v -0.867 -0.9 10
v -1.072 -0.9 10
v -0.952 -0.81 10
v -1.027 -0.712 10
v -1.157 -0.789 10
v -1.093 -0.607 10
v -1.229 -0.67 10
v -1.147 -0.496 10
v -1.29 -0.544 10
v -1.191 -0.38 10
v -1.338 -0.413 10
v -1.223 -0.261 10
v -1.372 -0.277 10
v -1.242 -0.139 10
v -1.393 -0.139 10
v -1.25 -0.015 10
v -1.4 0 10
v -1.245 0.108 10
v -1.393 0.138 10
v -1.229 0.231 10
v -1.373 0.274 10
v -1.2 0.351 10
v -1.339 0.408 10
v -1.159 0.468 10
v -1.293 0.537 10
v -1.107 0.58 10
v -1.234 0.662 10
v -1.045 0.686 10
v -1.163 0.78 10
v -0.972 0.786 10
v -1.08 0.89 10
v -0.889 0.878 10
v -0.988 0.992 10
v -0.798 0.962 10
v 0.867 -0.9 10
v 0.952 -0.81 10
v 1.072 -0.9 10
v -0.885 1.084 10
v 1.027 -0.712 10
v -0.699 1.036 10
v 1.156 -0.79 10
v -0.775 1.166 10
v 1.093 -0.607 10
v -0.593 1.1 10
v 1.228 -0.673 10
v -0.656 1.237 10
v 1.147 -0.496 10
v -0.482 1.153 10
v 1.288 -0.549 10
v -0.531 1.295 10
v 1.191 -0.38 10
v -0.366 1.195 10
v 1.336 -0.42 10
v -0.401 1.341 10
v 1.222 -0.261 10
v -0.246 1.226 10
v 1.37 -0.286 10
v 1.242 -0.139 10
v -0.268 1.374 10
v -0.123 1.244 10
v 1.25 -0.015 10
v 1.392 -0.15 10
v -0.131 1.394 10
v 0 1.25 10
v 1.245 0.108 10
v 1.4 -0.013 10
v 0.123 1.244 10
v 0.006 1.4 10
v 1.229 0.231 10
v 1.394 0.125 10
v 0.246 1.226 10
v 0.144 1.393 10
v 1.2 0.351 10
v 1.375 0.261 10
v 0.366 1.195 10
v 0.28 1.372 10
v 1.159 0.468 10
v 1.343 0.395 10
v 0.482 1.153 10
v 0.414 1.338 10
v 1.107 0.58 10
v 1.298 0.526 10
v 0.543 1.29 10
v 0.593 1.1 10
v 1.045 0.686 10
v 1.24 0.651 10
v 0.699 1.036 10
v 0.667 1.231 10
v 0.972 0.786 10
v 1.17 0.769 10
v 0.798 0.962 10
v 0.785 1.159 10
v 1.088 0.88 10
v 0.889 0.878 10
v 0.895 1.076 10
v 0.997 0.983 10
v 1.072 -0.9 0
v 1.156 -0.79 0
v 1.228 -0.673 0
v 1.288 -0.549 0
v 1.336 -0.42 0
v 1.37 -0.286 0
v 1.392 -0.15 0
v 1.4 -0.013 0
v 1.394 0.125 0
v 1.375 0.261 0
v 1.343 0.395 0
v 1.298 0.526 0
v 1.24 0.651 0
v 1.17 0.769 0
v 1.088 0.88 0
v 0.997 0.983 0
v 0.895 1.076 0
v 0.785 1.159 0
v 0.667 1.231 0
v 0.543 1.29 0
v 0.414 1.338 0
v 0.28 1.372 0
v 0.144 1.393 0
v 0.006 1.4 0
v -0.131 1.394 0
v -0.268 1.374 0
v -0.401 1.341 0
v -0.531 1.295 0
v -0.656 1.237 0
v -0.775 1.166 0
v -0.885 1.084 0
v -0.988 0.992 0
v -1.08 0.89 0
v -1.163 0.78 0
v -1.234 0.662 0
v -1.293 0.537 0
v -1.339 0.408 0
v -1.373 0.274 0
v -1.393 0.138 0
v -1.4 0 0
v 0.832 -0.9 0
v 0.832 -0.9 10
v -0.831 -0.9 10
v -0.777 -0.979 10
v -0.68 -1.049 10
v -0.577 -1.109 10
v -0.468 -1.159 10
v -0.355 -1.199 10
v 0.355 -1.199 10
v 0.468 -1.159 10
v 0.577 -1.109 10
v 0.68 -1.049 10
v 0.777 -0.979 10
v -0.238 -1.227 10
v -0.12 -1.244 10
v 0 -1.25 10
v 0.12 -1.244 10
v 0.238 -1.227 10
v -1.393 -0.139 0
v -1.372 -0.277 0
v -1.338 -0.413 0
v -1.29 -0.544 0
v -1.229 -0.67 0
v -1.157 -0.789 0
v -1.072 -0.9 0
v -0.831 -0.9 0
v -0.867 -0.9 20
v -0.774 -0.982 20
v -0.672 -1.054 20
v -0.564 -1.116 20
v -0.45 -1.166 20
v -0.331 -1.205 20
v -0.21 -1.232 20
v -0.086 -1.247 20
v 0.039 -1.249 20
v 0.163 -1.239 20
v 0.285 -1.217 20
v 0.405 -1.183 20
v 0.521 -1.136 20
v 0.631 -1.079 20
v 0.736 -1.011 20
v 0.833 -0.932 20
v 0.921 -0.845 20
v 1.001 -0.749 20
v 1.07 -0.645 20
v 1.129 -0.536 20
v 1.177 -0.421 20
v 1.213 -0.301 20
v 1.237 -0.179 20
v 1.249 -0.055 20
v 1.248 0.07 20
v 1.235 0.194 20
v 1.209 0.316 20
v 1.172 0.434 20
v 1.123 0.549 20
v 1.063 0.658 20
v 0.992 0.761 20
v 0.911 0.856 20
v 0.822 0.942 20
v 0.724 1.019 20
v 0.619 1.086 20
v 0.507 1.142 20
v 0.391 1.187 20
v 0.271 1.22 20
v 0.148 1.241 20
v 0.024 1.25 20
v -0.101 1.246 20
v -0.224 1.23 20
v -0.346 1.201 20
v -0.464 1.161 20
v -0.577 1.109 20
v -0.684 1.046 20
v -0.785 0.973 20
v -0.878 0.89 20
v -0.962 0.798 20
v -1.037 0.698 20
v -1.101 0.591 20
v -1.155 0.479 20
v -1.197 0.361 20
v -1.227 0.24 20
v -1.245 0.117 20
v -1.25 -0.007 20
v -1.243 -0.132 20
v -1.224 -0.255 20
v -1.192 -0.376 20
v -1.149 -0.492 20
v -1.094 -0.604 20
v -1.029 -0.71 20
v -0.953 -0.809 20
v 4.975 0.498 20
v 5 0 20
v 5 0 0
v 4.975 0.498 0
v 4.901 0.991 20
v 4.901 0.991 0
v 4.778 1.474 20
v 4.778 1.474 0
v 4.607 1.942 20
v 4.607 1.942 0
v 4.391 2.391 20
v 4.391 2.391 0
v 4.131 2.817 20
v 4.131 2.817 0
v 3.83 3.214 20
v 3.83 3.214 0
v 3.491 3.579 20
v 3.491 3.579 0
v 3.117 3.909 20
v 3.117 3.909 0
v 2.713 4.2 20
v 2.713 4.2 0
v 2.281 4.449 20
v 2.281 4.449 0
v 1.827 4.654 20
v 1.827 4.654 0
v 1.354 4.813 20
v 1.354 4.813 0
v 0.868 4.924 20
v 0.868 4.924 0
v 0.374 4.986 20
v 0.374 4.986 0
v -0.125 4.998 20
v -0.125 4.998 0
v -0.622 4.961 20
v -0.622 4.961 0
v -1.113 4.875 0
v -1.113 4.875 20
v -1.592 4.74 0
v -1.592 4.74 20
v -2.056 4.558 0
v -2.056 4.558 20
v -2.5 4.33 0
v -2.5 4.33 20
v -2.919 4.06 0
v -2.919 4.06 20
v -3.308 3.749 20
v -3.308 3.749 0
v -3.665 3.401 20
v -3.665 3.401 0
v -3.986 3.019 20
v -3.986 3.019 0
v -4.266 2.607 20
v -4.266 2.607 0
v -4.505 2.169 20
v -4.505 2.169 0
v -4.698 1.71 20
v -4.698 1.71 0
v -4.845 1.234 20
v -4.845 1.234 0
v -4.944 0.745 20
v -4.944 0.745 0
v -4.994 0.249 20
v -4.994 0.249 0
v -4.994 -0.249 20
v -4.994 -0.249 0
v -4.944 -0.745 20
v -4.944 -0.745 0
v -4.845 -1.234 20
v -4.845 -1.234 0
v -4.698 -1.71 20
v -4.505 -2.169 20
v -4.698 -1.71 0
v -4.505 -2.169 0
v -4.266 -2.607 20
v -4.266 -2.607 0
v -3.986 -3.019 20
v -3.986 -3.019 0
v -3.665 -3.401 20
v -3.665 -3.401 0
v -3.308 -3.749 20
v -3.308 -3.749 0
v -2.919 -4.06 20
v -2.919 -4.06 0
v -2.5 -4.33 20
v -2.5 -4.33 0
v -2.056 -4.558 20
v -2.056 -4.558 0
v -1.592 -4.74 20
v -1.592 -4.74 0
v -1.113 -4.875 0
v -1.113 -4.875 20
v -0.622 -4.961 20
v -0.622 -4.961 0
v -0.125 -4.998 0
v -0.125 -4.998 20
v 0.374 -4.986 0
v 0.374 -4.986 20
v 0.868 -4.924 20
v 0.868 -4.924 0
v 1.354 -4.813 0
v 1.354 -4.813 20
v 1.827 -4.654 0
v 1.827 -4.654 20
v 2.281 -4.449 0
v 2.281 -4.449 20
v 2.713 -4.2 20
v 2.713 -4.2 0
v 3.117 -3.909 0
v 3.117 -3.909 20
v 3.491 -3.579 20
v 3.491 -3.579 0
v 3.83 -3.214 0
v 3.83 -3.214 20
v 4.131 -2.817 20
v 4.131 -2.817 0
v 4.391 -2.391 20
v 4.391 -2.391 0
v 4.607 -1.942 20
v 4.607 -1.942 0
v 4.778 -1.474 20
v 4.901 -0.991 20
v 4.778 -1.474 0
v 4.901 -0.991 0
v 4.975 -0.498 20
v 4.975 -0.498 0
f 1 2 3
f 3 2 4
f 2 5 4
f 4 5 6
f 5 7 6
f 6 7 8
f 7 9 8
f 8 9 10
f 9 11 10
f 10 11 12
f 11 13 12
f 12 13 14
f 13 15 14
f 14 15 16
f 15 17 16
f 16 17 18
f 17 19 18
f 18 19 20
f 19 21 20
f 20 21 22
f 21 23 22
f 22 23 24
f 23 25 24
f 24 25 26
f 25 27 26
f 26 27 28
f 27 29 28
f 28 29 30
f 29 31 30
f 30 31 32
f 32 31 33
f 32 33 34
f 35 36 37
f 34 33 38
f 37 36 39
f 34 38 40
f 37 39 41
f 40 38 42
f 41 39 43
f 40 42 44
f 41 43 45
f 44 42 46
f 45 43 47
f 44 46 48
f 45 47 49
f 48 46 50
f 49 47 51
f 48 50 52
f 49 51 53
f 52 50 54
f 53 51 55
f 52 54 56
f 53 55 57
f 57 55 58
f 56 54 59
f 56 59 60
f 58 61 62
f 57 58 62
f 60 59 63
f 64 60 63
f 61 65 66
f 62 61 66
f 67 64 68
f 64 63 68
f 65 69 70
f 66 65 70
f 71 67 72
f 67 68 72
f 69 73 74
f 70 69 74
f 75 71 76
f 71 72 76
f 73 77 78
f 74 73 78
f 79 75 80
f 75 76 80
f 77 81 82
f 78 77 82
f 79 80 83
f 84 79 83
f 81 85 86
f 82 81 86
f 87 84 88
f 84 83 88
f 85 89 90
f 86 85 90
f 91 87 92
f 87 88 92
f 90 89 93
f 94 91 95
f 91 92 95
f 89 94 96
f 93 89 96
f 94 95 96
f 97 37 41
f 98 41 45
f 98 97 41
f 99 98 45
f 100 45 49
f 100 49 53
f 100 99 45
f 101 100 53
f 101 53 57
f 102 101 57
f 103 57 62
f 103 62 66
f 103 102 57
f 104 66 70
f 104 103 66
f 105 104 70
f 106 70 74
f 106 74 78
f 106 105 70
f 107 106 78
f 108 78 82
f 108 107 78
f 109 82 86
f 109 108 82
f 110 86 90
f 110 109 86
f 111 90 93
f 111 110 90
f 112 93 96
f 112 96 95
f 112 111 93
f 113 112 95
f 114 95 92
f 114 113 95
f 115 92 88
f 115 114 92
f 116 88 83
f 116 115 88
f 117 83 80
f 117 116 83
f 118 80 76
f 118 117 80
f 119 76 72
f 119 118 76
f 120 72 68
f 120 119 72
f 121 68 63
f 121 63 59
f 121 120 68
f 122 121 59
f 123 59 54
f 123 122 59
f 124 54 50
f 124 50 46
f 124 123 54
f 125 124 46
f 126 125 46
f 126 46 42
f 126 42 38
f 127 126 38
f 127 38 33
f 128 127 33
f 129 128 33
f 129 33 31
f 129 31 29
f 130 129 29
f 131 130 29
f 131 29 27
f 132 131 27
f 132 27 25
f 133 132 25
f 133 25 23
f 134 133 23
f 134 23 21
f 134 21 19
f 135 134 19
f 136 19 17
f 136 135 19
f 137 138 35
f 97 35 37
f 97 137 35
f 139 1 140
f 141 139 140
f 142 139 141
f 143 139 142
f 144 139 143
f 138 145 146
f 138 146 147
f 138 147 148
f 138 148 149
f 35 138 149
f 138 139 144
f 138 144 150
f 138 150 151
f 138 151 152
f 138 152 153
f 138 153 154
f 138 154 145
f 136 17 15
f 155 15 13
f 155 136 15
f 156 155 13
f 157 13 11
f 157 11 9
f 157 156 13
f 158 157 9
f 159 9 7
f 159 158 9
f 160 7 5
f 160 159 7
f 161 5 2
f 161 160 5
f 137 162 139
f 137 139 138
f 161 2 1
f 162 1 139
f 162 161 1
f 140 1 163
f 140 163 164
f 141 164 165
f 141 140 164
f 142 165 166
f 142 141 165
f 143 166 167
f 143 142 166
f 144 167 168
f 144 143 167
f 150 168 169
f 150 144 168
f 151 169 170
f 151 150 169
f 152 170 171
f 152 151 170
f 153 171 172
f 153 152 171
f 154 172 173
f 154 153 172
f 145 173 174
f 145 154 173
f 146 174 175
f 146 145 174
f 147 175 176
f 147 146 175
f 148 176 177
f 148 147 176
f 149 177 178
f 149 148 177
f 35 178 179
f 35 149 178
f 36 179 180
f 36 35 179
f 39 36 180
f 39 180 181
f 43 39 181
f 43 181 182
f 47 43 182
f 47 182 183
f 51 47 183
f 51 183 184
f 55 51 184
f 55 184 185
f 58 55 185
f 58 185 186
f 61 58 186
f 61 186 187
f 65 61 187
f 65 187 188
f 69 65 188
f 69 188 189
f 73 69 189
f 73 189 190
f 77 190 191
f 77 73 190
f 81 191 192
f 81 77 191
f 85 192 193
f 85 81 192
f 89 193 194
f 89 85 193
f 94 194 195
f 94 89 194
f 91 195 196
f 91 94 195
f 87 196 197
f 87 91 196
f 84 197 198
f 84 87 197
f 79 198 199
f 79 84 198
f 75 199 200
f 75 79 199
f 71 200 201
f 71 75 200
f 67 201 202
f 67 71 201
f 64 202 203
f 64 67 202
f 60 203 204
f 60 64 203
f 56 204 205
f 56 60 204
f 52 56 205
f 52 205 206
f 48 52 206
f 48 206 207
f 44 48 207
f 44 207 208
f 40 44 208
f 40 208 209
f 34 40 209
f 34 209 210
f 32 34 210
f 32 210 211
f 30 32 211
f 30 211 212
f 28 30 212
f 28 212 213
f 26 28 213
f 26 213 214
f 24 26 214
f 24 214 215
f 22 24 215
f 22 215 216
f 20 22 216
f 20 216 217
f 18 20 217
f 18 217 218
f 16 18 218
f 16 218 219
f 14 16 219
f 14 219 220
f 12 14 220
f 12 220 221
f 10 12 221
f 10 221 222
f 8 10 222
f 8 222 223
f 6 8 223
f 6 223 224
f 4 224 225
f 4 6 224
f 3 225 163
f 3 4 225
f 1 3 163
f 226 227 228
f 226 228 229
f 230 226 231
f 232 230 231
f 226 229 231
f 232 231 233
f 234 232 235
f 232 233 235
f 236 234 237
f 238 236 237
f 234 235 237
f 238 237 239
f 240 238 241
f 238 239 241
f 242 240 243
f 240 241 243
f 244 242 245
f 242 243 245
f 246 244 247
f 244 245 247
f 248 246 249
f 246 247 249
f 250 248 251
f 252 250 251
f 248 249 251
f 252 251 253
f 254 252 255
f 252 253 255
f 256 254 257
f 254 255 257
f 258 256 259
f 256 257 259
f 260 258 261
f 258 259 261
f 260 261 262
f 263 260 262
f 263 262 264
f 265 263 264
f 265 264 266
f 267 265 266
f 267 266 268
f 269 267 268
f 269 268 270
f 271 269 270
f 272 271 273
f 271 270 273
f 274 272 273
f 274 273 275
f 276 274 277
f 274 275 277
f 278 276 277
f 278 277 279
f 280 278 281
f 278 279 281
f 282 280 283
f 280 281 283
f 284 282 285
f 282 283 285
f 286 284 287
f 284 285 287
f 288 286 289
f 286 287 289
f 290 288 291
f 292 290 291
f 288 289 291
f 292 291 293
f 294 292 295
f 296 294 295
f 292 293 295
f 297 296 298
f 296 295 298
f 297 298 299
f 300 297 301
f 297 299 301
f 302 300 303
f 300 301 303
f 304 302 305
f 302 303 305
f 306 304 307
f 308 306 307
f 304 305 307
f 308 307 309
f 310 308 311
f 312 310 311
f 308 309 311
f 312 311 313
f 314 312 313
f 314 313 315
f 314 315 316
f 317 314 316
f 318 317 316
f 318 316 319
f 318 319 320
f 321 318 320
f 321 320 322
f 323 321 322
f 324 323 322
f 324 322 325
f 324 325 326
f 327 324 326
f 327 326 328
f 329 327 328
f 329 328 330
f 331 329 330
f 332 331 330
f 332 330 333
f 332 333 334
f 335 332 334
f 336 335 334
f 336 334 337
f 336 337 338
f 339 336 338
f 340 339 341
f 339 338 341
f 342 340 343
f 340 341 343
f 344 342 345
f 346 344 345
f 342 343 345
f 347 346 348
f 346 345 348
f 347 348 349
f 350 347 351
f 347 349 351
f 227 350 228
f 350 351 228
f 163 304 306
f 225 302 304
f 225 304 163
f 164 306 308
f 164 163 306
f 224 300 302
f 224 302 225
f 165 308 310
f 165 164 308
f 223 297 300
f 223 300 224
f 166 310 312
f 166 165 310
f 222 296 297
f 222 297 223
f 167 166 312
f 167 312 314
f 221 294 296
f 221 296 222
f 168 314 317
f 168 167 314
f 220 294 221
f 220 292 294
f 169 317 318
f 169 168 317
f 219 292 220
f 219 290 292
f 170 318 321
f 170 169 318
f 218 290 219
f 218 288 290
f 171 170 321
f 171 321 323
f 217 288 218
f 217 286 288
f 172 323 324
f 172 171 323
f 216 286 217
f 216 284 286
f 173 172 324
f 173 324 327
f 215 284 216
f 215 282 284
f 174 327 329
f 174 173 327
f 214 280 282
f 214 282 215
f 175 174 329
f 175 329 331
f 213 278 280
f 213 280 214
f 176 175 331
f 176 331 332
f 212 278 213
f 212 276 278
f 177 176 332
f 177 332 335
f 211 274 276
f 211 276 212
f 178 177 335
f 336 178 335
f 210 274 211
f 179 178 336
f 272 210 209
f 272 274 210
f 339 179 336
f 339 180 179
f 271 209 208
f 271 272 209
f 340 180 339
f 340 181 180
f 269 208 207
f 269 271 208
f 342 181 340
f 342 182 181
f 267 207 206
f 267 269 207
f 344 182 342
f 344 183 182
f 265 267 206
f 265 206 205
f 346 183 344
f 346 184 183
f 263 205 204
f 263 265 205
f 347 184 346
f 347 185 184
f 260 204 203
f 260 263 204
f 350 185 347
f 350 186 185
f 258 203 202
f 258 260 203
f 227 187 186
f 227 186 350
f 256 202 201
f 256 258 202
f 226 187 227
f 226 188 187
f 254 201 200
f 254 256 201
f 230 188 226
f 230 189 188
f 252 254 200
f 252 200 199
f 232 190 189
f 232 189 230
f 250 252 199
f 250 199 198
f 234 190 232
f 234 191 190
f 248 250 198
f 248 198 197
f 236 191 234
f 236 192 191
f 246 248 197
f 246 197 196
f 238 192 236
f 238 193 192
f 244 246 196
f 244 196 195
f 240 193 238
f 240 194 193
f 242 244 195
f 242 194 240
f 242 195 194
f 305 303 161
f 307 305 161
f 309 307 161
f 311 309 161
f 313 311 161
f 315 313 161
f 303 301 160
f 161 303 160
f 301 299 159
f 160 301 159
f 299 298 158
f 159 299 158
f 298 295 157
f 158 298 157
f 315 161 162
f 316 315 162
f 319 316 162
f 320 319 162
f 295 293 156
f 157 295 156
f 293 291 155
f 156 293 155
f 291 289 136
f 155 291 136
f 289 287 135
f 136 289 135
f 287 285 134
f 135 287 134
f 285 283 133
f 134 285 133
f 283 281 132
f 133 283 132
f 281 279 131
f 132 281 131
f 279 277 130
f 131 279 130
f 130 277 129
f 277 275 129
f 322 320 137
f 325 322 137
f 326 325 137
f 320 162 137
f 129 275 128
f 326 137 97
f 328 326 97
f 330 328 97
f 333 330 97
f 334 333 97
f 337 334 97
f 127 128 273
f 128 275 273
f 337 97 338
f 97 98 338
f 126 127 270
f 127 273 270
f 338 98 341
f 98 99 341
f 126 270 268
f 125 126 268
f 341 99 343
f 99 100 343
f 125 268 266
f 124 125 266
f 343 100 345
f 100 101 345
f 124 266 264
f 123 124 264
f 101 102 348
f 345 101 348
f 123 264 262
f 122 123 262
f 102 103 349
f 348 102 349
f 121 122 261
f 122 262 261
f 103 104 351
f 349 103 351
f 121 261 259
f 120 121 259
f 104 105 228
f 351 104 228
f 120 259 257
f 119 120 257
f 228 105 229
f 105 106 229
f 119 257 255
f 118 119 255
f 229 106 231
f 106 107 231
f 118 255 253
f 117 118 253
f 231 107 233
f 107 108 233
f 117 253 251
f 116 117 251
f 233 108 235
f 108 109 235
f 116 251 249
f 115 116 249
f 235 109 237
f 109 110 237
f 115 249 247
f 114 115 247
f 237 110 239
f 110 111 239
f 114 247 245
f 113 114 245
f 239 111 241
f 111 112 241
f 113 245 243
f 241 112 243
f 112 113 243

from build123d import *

# Parameters (mm, degrees)
SKETCH1_R           = 5
BOSS_EXTRUDE1_DEPTH = 10
SKETCH2_R           = 5
SKETCH2_R_2         = 1.25
BOSS_EXTRUDE2_DEPTH = 10


with BuildPart() as part:
    # Sketch1 → Boss-Extrude1 (new body)
    with BuildSketch(Plane.XY):
        Circle(SKETCH1_R)
        with BuildLine():
            Line((-1.072430112, -0.899940917), (-0.831301536, -0.9))
            Line((-0.831301536, -0.9), (0.831568399, -0.9))
            Line((0.831568399, -0.9), (1.07238053, -0.899999999))
            ThreePointArc((1.07238053, -0.899999999), (0.478887909, 1.315547936), (-1.4, 0))
            ThreePointArc((-1.4, 0), (-1.315561127, -0.478851669), (-1.072430112, -0.899940917))
        make_face(mode=Mode.SUBTRACT)
    extrude(amount=BOSS_EXTRUDE1_DEPTH)

    # Sketch2 → Boss-Extrude2 (add)
    with BuildSketch(Plane.XY.offset(10)):
        Circle(SKETCH2_R)
        Circle(SKETCH2_R_2, mode=Mode.SUBTRACT)
    extrude(amount=BOSS_EXTRUDE2_DEPTH)


solid = part.part
